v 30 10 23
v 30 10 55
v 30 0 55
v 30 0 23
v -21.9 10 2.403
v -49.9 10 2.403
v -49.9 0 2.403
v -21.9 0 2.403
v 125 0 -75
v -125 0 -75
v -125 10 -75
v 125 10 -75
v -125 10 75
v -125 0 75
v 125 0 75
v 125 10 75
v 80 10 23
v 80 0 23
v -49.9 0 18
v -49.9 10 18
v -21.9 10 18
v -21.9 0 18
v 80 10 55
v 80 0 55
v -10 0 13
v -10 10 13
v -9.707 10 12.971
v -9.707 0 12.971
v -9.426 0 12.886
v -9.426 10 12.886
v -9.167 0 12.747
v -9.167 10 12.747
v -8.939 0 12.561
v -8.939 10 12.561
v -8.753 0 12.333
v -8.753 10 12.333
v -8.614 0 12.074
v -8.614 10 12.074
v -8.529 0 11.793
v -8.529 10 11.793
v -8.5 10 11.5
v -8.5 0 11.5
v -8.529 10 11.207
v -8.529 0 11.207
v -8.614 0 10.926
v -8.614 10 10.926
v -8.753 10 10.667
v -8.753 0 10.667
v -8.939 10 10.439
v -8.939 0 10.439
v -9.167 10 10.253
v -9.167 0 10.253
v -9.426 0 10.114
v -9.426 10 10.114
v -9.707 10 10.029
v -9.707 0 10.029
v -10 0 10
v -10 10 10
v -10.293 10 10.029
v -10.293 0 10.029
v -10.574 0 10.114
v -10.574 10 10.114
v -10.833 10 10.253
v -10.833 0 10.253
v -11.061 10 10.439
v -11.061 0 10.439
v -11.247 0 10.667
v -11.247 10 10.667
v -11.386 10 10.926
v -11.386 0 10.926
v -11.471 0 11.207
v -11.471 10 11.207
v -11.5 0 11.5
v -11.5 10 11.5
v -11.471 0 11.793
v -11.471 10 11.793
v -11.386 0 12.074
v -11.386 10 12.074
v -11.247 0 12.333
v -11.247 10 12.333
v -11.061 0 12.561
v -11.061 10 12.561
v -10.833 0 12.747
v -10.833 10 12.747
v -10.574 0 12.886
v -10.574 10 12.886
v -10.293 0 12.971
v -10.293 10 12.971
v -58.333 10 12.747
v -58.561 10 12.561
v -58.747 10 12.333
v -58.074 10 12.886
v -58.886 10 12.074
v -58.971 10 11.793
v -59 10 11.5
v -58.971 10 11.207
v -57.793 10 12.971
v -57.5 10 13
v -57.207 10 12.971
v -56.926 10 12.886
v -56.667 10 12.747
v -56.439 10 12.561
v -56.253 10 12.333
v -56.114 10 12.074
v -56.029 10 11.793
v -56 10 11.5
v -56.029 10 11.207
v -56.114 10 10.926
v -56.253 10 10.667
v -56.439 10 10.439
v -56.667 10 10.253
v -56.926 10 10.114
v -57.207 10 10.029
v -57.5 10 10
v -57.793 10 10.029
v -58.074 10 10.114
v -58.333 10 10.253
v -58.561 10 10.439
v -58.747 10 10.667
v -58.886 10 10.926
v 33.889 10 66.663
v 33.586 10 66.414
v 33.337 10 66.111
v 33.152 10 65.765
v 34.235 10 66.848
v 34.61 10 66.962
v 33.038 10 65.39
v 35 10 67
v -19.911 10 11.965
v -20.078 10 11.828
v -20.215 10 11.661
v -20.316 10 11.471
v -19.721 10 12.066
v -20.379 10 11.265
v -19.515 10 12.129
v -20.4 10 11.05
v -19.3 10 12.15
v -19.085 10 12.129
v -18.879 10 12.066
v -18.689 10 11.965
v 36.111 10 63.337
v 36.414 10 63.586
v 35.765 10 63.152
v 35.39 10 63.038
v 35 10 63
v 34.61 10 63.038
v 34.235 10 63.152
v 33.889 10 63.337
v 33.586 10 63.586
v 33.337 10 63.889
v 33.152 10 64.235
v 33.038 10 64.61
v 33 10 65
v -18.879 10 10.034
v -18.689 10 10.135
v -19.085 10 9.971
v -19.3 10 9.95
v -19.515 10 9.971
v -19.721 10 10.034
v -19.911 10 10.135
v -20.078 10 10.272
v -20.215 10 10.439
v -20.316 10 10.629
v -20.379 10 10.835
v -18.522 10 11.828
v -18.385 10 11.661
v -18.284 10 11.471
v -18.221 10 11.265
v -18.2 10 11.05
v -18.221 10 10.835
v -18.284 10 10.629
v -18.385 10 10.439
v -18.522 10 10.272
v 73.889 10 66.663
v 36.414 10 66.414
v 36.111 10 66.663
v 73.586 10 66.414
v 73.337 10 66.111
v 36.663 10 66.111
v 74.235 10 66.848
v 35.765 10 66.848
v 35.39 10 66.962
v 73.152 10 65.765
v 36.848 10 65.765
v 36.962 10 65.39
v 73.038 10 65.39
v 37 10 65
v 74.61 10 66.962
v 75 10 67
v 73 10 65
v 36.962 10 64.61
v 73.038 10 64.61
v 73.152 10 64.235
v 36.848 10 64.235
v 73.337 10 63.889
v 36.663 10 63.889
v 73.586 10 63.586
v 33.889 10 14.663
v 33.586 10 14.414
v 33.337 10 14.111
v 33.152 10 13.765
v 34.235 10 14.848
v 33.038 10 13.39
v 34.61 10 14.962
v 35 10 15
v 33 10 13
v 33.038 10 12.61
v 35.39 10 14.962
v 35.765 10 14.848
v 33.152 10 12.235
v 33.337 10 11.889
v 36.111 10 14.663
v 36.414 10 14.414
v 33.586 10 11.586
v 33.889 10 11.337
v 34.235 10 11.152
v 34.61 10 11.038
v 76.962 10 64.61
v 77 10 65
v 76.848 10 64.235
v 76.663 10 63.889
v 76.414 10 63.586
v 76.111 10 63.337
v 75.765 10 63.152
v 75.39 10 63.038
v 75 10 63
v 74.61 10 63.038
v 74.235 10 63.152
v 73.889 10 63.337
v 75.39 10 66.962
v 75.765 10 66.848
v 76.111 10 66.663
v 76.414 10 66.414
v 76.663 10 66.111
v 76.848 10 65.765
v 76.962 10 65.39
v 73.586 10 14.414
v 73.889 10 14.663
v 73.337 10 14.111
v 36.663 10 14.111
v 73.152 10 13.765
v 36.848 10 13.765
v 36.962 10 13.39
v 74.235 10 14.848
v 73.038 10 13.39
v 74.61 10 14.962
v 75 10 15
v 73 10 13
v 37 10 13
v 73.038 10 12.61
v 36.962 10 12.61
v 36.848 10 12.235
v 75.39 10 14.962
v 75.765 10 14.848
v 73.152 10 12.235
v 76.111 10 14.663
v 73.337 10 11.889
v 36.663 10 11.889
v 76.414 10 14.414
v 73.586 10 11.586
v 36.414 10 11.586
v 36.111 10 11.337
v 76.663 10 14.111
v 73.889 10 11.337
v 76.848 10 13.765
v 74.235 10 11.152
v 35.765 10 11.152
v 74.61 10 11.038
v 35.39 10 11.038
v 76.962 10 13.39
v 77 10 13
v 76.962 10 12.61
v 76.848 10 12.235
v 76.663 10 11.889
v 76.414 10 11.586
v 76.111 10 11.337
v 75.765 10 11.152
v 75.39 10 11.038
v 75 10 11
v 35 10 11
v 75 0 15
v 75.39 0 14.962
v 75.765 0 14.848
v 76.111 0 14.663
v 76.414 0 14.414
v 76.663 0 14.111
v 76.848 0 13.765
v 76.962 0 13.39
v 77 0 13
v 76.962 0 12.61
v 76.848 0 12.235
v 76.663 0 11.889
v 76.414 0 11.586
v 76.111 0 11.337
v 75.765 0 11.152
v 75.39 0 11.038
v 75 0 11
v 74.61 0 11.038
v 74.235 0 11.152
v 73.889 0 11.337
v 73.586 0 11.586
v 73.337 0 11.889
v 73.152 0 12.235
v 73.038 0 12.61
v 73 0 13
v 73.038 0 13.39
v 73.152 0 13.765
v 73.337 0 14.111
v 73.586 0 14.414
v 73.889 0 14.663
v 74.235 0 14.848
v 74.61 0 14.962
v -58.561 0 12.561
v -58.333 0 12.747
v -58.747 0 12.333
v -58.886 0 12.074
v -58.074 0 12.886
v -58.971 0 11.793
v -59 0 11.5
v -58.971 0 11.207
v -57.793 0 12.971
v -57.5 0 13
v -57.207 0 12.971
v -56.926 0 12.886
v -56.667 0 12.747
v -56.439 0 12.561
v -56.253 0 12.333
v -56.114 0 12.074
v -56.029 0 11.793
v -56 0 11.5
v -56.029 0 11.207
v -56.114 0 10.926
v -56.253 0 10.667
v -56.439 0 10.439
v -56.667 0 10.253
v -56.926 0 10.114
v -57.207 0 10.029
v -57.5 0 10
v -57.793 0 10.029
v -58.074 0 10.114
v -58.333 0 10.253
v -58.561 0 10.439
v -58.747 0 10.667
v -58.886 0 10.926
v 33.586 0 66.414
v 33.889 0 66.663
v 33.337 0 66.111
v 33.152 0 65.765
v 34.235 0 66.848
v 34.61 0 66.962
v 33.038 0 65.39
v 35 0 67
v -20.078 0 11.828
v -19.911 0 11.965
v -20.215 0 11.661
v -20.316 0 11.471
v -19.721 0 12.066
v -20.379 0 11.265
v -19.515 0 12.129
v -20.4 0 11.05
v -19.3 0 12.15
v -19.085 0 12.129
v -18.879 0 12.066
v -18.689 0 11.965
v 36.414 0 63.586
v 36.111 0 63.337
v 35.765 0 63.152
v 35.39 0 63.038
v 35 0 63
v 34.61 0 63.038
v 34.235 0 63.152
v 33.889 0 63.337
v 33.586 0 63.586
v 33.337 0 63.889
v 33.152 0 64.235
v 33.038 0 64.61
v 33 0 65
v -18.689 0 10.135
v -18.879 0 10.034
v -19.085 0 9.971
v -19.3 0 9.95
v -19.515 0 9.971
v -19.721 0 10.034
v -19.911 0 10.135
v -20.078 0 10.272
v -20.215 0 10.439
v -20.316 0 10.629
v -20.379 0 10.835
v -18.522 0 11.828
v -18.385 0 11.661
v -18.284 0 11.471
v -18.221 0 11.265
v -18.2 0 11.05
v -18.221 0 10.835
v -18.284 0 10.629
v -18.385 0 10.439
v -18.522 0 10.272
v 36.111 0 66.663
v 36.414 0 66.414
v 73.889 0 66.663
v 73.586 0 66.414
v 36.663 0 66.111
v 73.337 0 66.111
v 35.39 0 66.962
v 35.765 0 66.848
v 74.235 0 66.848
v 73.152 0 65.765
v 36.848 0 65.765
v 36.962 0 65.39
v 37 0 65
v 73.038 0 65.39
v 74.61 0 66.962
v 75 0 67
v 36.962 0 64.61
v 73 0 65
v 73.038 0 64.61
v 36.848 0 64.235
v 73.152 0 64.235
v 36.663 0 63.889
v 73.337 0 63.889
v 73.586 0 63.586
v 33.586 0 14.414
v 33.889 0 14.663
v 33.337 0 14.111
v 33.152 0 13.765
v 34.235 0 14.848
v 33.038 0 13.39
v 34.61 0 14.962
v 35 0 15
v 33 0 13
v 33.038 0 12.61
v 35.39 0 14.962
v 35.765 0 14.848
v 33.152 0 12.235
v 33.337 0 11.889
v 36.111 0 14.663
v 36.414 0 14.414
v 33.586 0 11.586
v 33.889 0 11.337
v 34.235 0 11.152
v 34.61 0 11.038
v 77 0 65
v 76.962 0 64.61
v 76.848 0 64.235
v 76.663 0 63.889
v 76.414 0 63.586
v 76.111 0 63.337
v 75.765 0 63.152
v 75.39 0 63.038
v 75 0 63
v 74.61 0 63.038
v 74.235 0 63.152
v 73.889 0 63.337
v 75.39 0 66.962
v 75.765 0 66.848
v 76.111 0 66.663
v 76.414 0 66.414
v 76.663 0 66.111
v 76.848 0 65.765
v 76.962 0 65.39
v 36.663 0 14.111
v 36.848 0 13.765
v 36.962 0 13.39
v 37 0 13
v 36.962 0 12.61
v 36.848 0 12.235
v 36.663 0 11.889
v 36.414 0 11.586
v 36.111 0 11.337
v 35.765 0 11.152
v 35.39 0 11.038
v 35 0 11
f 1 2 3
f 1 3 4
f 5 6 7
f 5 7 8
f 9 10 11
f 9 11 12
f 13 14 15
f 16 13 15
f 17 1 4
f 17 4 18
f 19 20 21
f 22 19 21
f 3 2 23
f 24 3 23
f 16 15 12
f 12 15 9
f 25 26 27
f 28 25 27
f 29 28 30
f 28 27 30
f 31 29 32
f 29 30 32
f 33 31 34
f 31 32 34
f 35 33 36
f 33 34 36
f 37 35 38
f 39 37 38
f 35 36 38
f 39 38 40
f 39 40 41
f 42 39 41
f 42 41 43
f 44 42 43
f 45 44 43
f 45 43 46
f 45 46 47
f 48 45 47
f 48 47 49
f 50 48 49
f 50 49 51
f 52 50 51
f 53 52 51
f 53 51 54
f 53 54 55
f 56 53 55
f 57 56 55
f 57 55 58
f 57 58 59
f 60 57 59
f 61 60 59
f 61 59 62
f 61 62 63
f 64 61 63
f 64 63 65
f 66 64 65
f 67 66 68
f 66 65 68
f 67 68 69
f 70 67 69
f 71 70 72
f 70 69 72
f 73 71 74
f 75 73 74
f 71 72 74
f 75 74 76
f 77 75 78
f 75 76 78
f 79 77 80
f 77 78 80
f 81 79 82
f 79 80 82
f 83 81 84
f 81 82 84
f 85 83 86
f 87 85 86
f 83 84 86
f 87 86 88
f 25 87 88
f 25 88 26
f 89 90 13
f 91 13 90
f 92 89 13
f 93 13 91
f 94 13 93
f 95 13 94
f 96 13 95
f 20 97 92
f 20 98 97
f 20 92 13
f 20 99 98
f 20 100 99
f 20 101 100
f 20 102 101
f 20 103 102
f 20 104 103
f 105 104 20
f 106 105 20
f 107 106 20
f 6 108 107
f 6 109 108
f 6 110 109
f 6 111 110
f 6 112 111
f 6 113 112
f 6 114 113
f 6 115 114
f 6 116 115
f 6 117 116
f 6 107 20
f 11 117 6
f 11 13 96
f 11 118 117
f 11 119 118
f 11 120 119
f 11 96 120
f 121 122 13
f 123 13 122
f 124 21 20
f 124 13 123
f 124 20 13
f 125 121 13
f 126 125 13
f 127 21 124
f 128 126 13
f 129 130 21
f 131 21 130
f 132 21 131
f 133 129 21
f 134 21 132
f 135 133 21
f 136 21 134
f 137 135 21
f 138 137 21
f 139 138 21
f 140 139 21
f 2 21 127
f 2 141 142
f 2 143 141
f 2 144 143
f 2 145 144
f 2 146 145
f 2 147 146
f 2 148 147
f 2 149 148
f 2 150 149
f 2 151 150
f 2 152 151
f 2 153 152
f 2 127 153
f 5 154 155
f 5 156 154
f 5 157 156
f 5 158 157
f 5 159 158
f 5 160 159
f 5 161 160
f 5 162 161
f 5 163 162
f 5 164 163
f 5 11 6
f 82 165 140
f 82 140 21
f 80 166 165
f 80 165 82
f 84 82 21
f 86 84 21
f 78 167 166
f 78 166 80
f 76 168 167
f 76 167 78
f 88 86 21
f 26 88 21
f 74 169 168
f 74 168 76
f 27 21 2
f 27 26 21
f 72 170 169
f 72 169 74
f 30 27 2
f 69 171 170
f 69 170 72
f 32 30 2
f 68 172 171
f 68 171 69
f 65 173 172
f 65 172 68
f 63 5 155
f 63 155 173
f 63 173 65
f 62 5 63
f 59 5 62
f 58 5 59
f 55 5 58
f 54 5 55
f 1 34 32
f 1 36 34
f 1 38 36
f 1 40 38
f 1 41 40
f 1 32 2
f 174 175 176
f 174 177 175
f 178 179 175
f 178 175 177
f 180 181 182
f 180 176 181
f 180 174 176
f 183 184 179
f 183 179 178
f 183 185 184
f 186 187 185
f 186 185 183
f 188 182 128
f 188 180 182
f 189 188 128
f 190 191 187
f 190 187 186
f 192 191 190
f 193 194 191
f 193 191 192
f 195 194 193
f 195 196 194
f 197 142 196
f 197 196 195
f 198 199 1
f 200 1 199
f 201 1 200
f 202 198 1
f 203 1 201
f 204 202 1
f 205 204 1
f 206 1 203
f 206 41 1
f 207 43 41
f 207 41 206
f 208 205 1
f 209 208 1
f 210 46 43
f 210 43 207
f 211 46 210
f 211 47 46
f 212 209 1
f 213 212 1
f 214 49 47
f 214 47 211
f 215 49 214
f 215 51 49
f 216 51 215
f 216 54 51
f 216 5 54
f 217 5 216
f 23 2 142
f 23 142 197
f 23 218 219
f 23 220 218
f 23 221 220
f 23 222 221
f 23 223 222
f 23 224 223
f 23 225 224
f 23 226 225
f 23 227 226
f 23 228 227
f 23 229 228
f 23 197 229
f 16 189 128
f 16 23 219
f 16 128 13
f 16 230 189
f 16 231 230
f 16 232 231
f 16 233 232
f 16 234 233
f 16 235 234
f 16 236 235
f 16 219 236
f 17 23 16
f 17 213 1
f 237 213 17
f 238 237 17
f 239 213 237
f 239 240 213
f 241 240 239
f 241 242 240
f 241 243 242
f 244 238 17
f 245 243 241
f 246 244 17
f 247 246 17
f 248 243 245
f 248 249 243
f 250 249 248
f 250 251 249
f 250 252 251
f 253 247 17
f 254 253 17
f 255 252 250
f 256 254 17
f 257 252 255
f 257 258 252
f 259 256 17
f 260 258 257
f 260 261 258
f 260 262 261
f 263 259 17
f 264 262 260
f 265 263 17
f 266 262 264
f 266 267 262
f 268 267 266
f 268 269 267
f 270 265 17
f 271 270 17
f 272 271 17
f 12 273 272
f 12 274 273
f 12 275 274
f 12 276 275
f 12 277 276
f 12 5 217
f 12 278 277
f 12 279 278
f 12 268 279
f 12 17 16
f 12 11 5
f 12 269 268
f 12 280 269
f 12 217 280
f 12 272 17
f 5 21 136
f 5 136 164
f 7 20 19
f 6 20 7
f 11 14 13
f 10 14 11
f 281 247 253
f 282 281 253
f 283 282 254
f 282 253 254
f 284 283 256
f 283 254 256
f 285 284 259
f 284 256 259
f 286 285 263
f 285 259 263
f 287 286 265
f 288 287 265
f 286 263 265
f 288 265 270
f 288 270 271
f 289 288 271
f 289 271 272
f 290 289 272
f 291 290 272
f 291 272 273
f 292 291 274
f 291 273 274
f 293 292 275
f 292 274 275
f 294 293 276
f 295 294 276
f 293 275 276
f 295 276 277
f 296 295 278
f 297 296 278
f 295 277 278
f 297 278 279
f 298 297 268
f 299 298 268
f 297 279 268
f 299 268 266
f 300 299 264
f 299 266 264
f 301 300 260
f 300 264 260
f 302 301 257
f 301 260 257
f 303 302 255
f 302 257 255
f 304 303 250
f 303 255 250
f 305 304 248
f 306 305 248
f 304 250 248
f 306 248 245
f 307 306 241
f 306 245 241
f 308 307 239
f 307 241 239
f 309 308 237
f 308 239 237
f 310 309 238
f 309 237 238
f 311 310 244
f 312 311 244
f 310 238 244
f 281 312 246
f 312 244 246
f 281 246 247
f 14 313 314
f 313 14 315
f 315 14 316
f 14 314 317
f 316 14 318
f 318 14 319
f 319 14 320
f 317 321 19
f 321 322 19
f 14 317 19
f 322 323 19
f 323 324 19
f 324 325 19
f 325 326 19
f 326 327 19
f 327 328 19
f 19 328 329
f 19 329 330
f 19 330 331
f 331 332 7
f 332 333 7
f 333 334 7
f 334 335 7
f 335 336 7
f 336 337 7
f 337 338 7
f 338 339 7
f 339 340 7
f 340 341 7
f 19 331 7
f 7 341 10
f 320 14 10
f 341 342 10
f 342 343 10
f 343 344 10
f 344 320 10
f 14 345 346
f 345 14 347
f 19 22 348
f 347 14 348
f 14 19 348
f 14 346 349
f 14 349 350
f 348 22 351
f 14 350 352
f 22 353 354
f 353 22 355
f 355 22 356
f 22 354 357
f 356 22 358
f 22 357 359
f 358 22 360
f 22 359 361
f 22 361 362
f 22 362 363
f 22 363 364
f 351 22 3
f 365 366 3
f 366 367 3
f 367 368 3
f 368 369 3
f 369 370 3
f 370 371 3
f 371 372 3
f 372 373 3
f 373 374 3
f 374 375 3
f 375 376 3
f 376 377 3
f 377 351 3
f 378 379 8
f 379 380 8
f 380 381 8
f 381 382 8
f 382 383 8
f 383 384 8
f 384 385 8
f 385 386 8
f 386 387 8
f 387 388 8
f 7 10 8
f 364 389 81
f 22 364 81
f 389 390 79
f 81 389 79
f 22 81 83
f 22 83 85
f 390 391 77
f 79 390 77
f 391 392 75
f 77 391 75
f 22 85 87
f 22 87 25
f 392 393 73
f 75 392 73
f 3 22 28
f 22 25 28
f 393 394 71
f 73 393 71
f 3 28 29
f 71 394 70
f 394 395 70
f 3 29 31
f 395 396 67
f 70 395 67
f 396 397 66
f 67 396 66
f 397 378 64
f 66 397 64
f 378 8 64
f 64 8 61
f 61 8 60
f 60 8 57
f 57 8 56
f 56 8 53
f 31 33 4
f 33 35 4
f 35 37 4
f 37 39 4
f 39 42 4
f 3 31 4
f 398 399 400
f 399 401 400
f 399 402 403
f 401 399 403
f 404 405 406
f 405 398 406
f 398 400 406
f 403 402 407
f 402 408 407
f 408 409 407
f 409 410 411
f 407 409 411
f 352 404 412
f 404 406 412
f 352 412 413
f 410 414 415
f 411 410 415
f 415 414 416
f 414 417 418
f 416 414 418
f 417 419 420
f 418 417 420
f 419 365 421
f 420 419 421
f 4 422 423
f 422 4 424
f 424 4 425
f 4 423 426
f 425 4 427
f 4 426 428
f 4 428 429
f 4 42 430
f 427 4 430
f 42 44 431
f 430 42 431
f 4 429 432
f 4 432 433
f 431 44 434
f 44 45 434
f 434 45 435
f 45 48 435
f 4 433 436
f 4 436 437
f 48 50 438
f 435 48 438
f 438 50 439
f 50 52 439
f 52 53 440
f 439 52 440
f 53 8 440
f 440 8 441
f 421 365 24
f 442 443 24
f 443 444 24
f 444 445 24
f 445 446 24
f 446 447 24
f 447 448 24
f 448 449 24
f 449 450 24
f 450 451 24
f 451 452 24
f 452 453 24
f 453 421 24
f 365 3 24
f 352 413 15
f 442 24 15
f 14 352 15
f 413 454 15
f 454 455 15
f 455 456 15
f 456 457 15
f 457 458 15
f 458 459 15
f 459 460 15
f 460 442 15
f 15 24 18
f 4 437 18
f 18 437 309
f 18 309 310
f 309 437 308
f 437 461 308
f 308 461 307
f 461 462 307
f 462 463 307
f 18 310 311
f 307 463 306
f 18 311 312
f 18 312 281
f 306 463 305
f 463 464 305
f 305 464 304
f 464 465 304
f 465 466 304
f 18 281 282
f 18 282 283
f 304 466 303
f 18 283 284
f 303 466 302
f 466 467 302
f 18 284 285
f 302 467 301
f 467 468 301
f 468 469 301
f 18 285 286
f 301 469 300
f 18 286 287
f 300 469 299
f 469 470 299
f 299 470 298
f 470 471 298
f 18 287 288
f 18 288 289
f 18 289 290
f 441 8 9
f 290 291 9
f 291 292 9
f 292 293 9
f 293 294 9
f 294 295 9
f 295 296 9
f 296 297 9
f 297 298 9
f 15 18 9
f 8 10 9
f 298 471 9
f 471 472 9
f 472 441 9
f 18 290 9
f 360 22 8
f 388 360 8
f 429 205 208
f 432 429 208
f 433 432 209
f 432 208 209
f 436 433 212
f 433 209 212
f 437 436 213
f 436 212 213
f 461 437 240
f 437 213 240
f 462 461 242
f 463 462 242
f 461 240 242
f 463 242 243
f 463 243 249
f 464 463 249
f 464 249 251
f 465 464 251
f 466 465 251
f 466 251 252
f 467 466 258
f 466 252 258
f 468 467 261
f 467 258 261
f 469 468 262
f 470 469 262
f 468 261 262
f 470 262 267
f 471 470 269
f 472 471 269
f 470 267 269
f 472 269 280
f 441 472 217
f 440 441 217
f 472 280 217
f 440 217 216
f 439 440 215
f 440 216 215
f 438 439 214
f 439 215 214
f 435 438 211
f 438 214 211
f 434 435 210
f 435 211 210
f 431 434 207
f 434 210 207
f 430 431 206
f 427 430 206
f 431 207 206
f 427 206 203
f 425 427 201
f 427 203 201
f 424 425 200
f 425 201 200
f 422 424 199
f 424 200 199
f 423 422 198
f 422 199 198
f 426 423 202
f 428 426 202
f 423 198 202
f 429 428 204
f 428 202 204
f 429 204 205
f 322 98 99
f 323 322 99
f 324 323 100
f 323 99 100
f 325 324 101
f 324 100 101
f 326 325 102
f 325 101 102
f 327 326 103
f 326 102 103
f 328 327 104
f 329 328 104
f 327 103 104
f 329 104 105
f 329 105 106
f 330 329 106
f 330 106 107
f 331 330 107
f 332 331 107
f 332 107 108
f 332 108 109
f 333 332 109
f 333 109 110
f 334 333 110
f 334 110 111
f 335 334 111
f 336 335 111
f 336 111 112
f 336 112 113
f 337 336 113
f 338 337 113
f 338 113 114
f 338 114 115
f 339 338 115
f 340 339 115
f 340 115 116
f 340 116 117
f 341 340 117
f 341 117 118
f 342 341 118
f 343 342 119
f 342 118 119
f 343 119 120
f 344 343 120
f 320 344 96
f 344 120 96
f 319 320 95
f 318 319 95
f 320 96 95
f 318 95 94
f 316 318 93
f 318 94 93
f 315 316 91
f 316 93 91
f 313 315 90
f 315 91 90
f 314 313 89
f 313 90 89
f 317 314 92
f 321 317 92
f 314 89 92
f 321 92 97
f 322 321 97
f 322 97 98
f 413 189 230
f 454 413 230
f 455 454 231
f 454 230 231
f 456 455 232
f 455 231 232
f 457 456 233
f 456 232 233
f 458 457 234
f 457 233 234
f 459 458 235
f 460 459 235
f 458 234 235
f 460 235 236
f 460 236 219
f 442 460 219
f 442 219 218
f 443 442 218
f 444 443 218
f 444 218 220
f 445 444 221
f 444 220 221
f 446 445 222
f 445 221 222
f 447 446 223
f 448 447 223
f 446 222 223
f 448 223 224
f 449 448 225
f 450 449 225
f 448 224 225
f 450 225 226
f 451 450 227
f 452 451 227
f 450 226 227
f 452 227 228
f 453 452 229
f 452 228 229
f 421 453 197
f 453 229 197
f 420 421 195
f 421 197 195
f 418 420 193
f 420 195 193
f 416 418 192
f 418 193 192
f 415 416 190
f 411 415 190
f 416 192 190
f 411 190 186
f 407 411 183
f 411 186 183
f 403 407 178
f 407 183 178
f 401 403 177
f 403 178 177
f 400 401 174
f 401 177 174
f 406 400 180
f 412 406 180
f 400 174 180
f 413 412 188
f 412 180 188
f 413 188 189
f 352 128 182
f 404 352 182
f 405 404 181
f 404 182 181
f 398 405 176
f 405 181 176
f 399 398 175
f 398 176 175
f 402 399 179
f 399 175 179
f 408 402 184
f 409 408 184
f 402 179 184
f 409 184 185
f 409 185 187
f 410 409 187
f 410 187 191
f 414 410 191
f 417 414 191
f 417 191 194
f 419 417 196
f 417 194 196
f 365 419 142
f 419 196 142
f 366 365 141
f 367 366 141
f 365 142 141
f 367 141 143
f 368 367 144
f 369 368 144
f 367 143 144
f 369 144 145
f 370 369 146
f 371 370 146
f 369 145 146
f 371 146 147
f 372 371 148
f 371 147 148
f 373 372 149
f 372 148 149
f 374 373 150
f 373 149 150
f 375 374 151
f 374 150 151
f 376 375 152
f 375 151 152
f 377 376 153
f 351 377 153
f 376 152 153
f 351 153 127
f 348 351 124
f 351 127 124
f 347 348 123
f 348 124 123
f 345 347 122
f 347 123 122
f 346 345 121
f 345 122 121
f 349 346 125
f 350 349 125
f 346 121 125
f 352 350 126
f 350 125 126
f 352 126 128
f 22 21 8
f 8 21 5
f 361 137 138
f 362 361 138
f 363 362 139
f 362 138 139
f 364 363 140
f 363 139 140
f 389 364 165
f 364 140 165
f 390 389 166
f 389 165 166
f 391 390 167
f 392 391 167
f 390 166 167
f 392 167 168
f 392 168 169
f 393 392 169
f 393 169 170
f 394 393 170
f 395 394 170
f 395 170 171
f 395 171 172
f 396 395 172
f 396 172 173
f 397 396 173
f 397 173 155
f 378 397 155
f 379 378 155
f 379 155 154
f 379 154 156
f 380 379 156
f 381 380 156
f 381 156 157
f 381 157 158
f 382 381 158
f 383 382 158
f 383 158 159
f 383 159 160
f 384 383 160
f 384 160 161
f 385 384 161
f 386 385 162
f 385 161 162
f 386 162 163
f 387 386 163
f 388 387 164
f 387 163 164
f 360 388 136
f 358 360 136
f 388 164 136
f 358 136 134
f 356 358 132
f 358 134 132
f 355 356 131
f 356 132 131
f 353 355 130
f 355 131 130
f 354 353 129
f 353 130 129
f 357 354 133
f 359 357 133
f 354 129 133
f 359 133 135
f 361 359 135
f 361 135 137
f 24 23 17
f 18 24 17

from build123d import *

# Parameters (mm, degrees)
SKETCH2_W           = 250
SKETCH2_H           = 150
BOSS_EXTRUDE1_DEPTH = 10
SKETCH3_R           = 2
SKETCH3_W           = 50
SKETCH3_H           = 32
CUT_EXTRUDE1_DEPTH  = 10
SKETCH4_W           = 28
SKETCH4_H           = 15.597165116
CUT_EXTRUDE2_DEPTH  = 10
SKETCH5_R           = 1.5
SKETCH5_R_2         = 1.1
CUT_EXTRUDE3_DEPTH  = 147.116391962


with BuildPart() as part:
    # Sketch2 → Boss-Extrude1 (new body)
    with BuildSketch(Plane(origin=(0, 0, 0), x_dir=(1, 0, 0), z_dir=(0, 1, 0))):
        Rectangle(SKETCH2_W, SKETCH2_H)
    extrude(amount=BOSS_EXTRUDE1_DEPTH)

    # Sketch3 → Cut-Extrude1 (cut)
    with BuildSketch(Plane(origin=(0, 10, 0), x_dir=(1, 0, 0), z_dir=(0, 1, 0))):
        with Locations(Location((35, -13, 0), (0, 0, 270))):
            Circle(SKETCH3_R)
        with Locations(Location((75, -13, 0), (0, 0, 270))):
            Circle(SKETCH3_R)
        with Locations(Location((35, -65, 0), (0, 0, 270))):
            Circle(SKETCH3_R)
        with Locations(Location((75, -65, 0), (0, 0, 270))):
            Circle(SKETCH3_R)
        with Locations((55, -39)):
            Rectangle(SKETCH3_W, SKETCH3_H)
    extrude(amount=-CUT_EXTRUDE1_DEPTH, mode=Mode.SUBTRACT)

    # Sketch4 → Cut-Extrude2 (cut)
    with BuildSketch(Plane(origin=(0, 10, 0), x_dir=(1, 0, 0), z_dir=(0, 1, 0))):
        with Locations((-35.9, -10.201417442)):
            Rectangle(SKETCH4_W, SKETCH4_H)
    extrude(amount=-CUT_EXTRUDE2_DEPTH, mode=Mode.SUBTRACT)

    # Sketch5 → Cut-Extrude3 (cut, through all)
    with BuildSketch(Plane(origin=(0, 10, 0), x_dir=(1, 0, 0), z_dir=(0, 1, 0))):
        with Locations(Location((-10, -11.5, 0), (0, 0, 270))):
            Circle(SKETCH5_R)
        with Locations(Location((-57.5, -11.5, 0), (0, 0, 270))):
            Circle(SKETCH5_R)
        with Locations(Location((-19.3, -11.05, 0), (0, 0, 270))):
            Circle(SKETCH5_R_2)
    extrude(amount=-CUT_EXTRUDE3_DEPTH, mode=Mode.SUBTRACT)


solid = part.part
